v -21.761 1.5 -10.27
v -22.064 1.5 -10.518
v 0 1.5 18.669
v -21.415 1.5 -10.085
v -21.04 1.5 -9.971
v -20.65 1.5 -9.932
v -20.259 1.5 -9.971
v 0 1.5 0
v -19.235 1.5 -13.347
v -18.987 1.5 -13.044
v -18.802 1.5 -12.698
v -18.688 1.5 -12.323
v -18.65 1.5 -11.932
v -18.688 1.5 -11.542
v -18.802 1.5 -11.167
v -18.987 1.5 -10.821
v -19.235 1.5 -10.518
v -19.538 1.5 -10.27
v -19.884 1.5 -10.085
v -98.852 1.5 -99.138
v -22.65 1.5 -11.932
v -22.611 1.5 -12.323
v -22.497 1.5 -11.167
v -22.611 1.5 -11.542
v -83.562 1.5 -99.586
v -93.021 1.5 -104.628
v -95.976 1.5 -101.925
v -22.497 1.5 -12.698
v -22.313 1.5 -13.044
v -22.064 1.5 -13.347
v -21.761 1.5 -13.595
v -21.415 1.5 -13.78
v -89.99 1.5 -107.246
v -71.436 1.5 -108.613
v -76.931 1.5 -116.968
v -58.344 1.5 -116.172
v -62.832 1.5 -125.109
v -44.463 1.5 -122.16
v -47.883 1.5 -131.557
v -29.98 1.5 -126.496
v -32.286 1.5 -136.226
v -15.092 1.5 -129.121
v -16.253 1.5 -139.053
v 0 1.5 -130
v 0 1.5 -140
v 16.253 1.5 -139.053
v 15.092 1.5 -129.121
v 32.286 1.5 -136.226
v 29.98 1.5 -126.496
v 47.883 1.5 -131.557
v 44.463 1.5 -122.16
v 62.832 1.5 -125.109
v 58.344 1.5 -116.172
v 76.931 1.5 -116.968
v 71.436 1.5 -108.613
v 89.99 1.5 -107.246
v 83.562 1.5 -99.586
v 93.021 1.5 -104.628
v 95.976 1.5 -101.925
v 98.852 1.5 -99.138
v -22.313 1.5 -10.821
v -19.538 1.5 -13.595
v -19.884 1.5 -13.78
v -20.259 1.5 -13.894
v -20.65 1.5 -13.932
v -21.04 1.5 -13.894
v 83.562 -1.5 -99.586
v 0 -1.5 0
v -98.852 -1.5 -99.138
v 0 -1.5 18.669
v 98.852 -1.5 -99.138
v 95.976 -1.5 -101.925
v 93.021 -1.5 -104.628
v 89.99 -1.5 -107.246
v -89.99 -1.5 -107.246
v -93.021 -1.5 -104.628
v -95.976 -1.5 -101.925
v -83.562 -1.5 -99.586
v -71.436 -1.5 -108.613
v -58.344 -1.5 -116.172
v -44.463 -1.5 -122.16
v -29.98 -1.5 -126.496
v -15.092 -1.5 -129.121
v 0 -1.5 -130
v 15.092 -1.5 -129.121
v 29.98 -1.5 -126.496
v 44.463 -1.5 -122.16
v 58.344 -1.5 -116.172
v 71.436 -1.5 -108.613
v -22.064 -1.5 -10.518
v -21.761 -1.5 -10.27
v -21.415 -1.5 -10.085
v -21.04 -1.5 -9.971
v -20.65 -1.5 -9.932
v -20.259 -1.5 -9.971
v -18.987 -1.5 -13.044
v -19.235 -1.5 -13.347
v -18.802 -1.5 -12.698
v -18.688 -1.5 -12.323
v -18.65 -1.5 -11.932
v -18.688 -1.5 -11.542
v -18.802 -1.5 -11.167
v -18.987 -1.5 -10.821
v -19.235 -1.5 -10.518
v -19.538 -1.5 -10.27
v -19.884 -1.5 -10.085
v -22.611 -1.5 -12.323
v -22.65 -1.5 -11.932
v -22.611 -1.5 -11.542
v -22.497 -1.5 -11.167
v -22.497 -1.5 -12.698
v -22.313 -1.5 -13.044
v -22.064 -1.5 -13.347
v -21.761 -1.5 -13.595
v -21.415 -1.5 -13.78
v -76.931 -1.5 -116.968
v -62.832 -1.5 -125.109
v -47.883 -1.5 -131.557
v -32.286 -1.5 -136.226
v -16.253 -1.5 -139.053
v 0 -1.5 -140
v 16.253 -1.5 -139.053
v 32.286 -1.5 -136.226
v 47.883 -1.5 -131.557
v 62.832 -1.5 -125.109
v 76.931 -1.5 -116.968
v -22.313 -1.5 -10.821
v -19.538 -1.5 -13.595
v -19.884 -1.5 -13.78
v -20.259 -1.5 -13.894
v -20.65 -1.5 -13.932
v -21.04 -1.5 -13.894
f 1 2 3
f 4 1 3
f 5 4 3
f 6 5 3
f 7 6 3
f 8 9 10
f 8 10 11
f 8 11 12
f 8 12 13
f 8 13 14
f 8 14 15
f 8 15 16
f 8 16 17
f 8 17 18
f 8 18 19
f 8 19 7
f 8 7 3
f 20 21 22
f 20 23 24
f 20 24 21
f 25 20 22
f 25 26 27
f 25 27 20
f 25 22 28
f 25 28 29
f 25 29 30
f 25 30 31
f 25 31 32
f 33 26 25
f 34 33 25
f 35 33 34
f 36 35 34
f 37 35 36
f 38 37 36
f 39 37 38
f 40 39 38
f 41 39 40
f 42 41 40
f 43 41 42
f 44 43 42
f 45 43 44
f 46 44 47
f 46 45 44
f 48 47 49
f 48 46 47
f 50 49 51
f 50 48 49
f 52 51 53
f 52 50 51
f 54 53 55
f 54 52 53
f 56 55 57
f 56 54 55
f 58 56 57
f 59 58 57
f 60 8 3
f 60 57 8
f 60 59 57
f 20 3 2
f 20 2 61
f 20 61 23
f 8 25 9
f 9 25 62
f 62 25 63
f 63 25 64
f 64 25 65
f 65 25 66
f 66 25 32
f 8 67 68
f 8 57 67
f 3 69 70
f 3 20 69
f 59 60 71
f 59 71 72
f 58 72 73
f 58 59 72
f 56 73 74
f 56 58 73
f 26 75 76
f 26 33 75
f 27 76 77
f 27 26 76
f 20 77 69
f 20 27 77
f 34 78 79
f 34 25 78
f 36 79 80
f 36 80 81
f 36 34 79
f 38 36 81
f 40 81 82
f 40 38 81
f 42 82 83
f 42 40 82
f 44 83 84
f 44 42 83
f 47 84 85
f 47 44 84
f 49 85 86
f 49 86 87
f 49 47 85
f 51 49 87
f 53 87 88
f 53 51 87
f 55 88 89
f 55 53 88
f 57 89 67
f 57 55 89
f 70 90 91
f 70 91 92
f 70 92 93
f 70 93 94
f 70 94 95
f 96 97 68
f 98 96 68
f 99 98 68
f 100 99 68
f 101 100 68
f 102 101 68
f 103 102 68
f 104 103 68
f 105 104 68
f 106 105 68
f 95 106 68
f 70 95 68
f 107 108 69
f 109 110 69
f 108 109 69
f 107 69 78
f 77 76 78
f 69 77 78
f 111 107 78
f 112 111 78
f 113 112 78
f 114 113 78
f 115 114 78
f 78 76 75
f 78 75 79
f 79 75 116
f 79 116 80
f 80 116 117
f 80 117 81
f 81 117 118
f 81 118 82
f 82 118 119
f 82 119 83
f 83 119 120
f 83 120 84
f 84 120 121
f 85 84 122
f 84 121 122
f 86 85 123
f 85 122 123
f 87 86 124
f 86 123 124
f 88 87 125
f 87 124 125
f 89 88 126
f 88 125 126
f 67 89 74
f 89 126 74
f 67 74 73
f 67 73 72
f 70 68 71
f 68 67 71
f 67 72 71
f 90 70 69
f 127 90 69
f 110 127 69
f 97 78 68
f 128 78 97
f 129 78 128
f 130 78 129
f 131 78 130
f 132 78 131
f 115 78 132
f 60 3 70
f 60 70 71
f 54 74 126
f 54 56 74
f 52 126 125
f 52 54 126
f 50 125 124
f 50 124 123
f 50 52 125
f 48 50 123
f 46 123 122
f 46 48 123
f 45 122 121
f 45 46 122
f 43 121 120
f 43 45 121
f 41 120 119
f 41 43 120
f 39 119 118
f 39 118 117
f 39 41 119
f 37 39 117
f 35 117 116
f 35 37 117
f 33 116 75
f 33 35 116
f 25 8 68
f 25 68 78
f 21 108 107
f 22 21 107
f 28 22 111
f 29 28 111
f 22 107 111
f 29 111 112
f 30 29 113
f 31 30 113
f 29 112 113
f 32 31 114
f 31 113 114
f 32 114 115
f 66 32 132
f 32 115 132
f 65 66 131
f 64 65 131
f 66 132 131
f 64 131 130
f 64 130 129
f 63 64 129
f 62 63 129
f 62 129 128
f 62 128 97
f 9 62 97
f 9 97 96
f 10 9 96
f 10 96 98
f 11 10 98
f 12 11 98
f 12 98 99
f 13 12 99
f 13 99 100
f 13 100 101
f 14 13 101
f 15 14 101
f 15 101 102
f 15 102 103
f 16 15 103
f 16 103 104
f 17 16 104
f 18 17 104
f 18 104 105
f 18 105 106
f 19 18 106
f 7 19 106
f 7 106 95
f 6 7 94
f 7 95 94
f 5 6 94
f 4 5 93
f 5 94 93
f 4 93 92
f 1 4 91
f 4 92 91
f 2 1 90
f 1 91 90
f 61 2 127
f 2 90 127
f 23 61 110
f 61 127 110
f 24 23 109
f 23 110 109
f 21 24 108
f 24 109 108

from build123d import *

# Parameters (mm, degrees)
DODANIE_WYCI_GNI_CIE1_DEPTH = 1.5
OTWORY_USTALAJ_CE_4_0MM1_D  = 4


with BuildPart() as part:
    # Szkic1 → Dodanie-wyciągnięcie1 (new, symmetric)
    with BuildSketch(Plane(origin=(0, 0, 0), x_dir=(1, 0, 0), z_dir=(0, 1, 0))):
        with BuildLine():
            Line((-98.851612767, 99.138078726), (0, -18.668685922))
            Line((0, -18.668685922), (98.851612767, 99.138078726))
            ThreePointArc((98.851612767, 99.138078726), (94.507932102, 103.28722462), (89.990265356, 107.246222037))
            ThreePointArc((89.990265356, 107.246222037), (0, 140), (-89.990265356, 107.246222037))
            ThreePointArc((-89.990265356, 107.246222037), (-94.507932102, 103.28722462), (-98.851612767, 99.138078726))
        make_face()
        with BuildLine():
            Line((0, 0), (-83.562389259, 99.585777605))
            ThreePointArc((-83.562389259, 99.585777605), (0, 130), (83.562389259, 99.585777605))
            Line((83.562389259, 99.585777605), (0, 0))
        make_face(mode=Mode.SUBTRACT)
    extrude(amount=DODANIE_WYCI_GNI_CIE1_DEPTH, both=True)

    # Otwory ustalające Ø4.0mm1 (through all)
    with Locations(Plane(origin=(0, 1.5, 0), x_dir=(1, 0, 0), z_dir=(0, 1, 0))):
        with Locations((65, 50), (-65, 50), (-20.649569124, 11.932485481)):
            Hole(OTWORY_USTALAJ_CE_4_0MM1_D / 2)


solid = part.part
